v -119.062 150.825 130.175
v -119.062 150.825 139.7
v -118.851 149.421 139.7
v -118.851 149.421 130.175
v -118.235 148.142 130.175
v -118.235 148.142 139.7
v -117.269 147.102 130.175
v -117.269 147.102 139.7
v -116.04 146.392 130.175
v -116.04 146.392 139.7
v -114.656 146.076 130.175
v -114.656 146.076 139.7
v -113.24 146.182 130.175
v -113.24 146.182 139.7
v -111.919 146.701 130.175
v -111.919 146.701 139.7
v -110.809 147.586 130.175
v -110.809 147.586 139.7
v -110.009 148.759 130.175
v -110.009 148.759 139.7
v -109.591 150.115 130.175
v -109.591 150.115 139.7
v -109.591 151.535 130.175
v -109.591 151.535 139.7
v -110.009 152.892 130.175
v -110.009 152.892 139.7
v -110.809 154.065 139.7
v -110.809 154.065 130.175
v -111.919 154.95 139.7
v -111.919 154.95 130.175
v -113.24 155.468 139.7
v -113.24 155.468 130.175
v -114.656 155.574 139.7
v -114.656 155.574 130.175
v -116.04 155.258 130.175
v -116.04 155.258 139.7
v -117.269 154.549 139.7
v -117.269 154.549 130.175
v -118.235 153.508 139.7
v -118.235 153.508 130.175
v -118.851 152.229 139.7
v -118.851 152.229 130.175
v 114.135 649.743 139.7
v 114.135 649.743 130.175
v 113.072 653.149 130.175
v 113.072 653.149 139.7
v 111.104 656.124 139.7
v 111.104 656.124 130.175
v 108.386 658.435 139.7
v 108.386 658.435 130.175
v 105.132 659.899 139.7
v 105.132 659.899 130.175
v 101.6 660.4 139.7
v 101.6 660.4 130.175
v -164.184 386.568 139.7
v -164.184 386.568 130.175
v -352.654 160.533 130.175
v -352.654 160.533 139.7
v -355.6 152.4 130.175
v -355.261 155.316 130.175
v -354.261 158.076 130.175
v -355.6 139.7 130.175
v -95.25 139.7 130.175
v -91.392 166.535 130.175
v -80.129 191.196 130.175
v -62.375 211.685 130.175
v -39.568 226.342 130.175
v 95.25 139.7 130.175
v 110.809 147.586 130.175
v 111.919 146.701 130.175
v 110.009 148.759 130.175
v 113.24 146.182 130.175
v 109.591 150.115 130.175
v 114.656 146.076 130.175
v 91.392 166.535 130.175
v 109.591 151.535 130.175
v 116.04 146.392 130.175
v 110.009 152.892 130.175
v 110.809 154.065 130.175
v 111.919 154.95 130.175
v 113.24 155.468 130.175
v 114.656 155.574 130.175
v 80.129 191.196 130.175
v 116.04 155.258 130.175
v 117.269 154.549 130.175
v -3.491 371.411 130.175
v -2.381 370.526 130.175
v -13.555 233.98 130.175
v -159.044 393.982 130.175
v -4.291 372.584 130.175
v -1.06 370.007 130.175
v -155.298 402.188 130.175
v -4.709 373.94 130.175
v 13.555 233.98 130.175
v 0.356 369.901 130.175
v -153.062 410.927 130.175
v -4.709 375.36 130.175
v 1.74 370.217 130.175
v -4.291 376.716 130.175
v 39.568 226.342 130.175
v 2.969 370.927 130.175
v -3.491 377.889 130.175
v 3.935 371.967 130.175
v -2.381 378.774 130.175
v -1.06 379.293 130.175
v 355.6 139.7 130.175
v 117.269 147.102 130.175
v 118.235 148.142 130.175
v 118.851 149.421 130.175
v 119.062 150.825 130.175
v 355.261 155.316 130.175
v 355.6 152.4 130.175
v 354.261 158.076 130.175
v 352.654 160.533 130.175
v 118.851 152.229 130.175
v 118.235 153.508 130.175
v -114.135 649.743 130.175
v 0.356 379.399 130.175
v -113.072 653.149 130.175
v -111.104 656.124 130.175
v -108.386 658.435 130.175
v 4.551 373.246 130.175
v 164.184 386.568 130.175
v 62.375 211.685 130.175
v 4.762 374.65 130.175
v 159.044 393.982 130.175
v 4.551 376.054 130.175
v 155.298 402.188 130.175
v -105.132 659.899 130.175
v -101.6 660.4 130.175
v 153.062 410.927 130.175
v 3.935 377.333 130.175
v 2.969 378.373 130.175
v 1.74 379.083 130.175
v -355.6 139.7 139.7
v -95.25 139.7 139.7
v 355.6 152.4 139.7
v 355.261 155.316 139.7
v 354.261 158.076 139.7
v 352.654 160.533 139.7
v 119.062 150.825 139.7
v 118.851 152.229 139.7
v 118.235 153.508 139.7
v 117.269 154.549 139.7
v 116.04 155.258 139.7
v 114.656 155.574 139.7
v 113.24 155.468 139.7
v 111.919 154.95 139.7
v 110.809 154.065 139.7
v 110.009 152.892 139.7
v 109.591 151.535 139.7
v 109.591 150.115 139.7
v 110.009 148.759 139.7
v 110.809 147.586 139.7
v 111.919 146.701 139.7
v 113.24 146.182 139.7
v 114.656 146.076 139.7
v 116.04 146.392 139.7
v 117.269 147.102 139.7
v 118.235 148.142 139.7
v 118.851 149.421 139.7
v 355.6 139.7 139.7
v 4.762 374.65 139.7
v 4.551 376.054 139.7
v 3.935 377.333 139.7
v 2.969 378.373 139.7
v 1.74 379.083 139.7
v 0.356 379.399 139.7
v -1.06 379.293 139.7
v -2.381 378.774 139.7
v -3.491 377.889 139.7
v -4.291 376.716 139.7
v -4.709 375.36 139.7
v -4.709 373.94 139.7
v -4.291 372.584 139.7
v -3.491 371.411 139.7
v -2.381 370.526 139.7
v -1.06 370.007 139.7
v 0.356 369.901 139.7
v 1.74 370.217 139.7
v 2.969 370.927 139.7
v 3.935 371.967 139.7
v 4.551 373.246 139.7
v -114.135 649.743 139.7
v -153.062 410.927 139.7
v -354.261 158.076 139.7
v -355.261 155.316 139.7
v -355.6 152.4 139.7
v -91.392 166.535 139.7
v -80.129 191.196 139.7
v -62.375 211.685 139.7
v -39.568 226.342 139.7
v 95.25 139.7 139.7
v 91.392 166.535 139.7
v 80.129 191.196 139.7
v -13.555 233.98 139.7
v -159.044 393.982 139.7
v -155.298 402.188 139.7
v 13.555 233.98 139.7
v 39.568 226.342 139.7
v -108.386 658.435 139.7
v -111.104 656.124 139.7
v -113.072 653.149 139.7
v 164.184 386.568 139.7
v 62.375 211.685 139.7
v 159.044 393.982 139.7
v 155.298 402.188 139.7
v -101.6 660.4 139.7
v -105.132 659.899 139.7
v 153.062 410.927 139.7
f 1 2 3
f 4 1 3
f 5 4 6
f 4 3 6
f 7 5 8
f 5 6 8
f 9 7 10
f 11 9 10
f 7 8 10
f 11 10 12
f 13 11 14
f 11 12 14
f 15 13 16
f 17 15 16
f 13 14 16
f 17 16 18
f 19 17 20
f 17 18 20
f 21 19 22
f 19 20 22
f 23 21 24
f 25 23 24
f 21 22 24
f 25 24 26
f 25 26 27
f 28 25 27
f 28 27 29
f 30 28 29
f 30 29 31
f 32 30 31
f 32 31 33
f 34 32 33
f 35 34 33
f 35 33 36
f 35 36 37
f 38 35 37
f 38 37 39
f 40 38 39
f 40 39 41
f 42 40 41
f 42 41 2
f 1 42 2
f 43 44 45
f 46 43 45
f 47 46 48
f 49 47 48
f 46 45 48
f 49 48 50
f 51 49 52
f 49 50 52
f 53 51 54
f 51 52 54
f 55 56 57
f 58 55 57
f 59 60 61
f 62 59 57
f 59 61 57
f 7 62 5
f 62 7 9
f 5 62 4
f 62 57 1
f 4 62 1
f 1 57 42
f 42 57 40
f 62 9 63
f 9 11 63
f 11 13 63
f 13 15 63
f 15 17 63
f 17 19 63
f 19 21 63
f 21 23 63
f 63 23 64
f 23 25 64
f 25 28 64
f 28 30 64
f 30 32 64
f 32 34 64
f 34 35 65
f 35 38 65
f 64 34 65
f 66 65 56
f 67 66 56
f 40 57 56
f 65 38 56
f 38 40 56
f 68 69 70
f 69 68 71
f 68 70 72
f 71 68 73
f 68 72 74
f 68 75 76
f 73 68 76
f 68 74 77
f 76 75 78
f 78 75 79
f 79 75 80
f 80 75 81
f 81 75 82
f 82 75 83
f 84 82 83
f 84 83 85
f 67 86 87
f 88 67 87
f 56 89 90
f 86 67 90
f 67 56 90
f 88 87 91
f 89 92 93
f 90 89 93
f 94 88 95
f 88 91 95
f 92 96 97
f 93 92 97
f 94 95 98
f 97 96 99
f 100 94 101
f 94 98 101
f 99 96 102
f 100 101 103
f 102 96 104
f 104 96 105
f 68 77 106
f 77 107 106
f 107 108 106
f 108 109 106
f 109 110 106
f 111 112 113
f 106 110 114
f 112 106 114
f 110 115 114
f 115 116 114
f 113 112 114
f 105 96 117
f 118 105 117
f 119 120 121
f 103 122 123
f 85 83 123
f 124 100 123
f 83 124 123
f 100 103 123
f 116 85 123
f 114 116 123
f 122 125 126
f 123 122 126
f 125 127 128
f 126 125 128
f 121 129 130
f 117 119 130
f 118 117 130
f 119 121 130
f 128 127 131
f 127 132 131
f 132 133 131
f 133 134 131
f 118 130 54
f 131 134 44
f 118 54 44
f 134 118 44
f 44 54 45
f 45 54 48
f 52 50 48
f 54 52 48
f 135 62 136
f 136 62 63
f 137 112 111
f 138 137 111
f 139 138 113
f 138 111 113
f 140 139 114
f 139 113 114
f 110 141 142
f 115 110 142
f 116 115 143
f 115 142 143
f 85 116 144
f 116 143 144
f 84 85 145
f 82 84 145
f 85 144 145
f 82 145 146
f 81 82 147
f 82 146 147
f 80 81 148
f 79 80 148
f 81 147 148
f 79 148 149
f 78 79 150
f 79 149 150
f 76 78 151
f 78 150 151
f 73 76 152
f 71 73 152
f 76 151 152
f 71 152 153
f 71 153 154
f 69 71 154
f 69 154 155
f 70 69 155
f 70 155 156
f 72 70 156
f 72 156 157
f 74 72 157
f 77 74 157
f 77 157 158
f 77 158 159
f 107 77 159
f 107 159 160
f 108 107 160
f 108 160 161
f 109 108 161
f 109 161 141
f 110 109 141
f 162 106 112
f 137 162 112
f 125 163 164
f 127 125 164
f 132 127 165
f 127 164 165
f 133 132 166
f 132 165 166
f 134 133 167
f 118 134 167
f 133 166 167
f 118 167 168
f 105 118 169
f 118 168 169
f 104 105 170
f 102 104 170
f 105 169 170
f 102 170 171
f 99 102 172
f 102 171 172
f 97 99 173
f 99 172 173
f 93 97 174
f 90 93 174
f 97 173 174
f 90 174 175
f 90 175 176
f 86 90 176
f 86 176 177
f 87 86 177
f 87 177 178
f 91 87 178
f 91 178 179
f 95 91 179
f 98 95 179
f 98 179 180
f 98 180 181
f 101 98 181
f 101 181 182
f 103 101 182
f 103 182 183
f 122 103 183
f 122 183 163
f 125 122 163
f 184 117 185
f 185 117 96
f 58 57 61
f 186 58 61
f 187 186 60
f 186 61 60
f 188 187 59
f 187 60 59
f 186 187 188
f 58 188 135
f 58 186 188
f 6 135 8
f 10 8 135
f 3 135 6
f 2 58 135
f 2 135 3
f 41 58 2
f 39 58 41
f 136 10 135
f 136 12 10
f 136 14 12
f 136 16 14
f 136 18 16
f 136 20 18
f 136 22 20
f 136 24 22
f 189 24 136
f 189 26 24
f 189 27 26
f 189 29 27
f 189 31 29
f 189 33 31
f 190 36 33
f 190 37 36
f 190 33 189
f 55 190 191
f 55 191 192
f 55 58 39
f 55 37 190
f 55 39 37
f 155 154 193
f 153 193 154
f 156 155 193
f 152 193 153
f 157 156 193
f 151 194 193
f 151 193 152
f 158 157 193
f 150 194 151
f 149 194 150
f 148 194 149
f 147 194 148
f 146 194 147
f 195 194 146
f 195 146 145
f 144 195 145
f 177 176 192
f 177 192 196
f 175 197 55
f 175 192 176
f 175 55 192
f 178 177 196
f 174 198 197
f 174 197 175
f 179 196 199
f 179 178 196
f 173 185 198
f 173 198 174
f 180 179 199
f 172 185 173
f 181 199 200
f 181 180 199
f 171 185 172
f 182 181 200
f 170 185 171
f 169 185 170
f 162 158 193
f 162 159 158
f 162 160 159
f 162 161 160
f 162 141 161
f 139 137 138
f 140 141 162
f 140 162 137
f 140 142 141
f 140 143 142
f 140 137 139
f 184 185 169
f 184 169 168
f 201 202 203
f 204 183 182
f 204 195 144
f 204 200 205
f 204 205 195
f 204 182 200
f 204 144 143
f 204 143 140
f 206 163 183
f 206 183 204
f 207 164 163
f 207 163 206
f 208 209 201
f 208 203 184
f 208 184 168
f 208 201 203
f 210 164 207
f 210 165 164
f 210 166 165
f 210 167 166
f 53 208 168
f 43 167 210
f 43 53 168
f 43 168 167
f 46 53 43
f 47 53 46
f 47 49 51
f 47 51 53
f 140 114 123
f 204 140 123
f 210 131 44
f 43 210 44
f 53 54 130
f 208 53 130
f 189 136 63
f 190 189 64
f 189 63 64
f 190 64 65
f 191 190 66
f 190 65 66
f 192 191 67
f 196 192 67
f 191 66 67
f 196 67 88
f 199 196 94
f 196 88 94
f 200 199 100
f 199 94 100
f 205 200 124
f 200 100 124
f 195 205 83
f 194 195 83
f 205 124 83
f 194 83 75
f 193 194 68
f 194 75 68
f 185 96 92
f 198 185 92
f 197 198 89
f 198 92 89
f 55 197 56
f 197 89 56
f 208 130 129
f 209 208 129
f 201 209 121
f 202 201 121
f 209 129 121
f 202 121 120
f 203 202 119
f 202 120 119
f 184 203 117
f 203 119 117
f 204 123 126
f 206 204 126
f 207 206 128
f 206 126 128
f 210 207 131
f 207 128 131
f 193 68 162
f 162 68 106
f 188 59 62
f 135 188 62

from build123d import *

# Parameters (mm, degrees)
BASE_EXTRUDE_DEPTH = 9.525
SKETCH4_R          = 4.7625
CUT_EXTRUDE1_DEPTH = 751.113488497


with BuildPart() as part:
    # Sketch1 → Base-Extrude (new body)
    with BuildSketch(Plane.XY.offset(130.175)):
        with BuildLine():
            Line((-114.134574641, 649.743144285), (-153.061701436, 410.92742286))
            ThreePointArc((-153.061701436, 410.92742286), (-156.988617271, 398.001466727), (-164.183568949, 386.567583735))
            Line((-164.183568949, 386.567583735), (-352.654107763, 160.533104066))
            ThreePointArc((-352.654107763, 160.533104066), (-354.840836834, 156.72509141), (-355.6, 152.4))
            Line((-355.6, 152.4), (-355.6, 139.7))
            Line((-355.6, 139.7), (-95.25, 139.7))
            ThreePointArc((-95.25, 139.7), (0, 234.95), (95.25, 139.7))
            Line((95.25, 139.7), (355.6, 139.7))
            Line((355.6, 139.7), (355.6, 152.4))
            ThreePointArc((355.6, 152.4), (354.840836834, 156.72509141), (352.654107763, 160.533104066))
            Line((352.654107763, 160.533104066), (164.183568949, 386.567583735))
            ThreePointArc((164.183568949, 386.567583735), (156.988617271, 398.001466727), (153.061701436, 410.92742286))
            Line((153.061701436, 410.92742286), (114.134574641, 649.743144285))
            ThreePointArc((114.134574641, 649.743144285), (109.826240562, 657.375689444), (101.6, 660.4))
            Line((101.6, 660.4), (-101.6, 660.4))
            ThreePointArc((-101.6, 660.4), (-109.826240562, 657.375689444), (-114.134574641, 649.743144285))
        make_face()
    extrude(amount=BASE_EXTRUDE_DEPTH)

    # Sketch4 → Cut-Extrude1 (cut, through all)
    with BuildSketch(Plane.XY.offset(139.7)):
        with Locations((0, 374.65)):
            Circle(SKETCH4_R)
        with Locations((114.3, 150.8252)):
            Circle(SKETCH4_R)
        with Locations(Location((-114.3, 150.8252, 0), (0, 0, 180))):
            Circle(SKETCH4_R)
    extrude(amount=-CUT_EXTRUDE1_DEPTH, mode=Mode.SUBTRACT)


solid = part.part
